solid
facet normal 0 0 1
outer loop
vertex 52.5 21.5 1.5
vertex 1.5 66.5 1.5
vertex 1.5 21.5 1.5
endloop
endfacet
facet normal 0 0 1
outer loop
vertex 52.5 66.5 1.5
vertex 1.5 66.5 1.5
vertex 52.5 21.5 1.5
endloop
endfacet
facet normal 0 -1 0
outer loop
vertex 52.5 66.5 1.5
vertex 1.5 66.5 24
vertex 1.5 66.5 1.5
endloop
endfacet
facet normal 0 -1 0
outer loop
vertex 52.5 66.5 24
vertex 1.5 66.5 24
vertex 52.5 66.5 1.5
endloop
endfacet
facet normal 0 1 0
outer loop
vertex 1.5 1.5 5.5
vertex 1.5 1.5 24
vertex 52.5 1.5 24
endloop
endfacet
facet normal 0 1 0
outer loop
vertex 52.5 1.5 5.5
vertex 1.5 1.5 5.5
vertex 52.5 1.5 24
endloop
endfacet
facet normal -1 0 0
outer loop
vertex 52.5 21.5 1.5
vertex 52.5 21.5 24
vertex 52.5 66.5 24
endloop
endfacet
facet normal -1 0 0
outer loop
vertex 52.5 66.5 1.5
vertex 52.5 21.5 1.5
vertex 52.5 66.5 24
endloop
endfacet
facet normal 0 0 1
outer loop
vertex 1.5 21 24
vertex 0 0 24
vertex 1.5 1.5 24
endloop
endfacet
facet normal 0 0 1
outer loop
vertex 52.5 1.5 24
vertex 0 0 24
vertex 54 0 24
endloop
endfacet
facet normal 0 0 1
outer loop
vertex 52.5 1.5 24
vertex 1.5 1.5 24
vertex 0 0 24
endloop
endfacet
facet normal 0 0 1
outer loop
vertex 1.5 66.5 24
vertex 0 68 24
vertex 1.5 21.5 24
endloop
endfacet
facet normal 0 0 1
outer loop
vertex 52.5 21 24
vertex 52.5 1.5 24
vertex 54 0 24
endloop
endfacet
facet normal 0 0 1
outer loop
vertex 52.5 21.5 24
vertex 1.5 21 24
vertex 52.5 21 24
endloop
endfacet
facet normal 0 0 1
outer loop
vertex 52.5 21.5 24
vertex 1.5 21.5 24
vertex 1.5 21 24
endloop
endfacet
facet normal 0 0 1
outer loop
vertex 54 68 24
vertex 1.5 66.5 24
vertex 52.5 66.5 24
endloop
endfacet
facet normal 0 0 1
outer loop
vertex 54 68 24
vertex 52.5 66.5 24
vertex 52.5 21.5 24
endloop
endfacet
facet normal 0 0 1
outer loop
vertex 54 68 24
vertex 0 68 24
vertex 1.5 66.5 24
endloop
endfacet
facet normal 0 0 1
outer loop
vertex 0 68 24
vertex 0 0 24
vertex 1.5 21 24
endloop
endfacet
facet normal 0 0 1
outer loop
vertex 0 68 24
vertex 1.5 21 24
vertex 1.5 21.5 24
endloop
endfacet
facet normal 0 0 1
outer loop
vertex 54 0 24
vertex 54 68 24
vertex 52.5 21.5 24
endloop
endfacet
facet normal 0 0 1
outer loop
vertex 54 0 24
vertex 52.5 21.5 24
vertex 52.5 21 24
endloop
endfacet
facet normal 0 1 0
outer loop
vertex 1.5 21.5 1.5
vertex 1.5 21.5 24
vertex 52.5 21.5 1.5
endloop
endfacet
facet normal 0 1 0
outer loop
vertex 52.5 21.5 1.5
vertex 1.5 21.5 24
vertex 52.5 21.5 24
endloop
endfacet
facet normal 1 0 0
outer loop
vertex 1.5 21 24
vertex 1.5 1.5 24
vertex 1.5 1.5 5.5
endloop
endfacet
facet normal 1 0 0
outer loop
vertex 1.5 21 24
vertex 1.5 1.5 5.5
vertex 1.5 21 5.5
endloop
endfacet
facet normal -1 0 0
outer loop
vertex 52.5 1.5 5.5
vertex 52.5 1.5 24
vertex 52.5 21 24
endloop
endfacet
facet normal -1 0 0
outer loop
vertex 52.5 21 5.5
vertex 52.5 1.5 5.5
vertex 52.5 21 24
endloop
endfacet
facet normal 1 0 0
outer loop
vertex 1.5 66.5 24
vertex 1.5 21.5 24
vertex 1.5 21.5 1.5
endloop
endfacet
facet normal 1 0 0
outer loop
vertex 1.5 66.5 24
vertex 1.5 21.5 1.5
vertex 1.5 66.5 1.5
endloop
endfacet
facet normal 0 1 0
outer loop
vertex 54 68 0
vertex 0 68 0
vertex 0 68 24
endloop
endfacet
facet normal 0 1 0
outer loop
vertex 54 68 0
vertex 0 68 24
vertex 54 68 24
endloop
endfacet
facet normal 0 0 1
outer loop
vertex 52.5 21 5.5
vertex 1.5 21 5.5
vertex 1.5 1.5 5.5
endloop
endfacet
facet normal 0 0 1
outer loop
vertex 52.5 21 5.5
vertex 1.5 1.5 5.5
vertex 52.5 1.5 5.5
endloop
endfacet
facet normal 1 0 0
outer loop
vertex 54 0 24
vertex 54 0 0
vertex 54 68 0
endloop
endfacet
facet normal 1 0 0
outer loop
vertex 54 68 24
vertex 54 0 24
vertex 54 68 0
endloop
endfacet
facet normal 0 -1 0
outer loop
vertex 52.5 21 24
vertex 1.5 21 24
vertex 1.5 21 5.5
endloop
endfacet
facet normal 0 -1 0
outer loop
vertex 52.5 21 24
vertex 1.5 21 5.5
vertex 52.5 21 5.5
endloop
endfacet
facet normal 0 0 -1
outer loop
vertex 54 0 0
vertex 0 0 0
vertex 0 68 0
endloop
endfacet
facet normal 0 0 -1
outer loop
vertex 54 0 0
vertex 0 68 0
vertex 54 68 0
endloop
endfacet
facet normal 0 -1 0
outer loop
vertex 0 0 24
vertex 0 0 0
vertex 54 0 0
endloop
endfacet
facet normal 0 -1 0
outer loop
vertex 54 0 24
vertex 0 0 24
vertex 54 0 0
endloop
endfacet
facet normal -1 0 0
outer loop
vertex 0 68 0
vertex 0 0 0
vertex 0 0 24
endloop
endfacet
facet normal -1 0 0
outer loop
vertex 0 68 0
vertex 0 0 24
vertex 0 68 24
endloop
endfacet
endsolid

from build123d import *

# Parameters (mm, degrees)
SKETCH_W        = 54
SKETCH_H        = 68
PAD_DEPTH       = 24
SKETCH001_W     = 51
SKETCH001_H     = 45
POCKET_DEPTH    = 22.5
SKETCH002_W     = 51
SKETCH002_H     = 19.5
POCKET001_DEPTH = 18.5


with BuildPart() as part:
    # Sketch → Pad (new body)
    with BuildSketch(Plane.XY):
        with Locations((27, 34)):
            Rectangle(SKETCH_W, SKETCH_H)
    extrude(amount=PAD_DEPTH)

    # Sketch001 (on Face6 of Pad) → Pocket (cut)
    with BuildSketch(Plane.XY.offset(24)):
        with Locations((27, 44)):
            Rectangle(SKETCH001_W, SKETCH001_H)
    extrude(amount=-POCKET_DEPTH, mode=Mode.SUBTRACT)

    # Sketch002 (on Face5 of Pocket) → Pocket001 (cut)
    with BuildSketch(Plane.XY.offset(24)):
        with Locations((27, 11.25)):
            Rectangle(SKETCH002_W, SKETCH002_H)
    extrude(amount=-POCKET001_DEPTH, mode=Mode.SUBTRACT)


solid = part.part
